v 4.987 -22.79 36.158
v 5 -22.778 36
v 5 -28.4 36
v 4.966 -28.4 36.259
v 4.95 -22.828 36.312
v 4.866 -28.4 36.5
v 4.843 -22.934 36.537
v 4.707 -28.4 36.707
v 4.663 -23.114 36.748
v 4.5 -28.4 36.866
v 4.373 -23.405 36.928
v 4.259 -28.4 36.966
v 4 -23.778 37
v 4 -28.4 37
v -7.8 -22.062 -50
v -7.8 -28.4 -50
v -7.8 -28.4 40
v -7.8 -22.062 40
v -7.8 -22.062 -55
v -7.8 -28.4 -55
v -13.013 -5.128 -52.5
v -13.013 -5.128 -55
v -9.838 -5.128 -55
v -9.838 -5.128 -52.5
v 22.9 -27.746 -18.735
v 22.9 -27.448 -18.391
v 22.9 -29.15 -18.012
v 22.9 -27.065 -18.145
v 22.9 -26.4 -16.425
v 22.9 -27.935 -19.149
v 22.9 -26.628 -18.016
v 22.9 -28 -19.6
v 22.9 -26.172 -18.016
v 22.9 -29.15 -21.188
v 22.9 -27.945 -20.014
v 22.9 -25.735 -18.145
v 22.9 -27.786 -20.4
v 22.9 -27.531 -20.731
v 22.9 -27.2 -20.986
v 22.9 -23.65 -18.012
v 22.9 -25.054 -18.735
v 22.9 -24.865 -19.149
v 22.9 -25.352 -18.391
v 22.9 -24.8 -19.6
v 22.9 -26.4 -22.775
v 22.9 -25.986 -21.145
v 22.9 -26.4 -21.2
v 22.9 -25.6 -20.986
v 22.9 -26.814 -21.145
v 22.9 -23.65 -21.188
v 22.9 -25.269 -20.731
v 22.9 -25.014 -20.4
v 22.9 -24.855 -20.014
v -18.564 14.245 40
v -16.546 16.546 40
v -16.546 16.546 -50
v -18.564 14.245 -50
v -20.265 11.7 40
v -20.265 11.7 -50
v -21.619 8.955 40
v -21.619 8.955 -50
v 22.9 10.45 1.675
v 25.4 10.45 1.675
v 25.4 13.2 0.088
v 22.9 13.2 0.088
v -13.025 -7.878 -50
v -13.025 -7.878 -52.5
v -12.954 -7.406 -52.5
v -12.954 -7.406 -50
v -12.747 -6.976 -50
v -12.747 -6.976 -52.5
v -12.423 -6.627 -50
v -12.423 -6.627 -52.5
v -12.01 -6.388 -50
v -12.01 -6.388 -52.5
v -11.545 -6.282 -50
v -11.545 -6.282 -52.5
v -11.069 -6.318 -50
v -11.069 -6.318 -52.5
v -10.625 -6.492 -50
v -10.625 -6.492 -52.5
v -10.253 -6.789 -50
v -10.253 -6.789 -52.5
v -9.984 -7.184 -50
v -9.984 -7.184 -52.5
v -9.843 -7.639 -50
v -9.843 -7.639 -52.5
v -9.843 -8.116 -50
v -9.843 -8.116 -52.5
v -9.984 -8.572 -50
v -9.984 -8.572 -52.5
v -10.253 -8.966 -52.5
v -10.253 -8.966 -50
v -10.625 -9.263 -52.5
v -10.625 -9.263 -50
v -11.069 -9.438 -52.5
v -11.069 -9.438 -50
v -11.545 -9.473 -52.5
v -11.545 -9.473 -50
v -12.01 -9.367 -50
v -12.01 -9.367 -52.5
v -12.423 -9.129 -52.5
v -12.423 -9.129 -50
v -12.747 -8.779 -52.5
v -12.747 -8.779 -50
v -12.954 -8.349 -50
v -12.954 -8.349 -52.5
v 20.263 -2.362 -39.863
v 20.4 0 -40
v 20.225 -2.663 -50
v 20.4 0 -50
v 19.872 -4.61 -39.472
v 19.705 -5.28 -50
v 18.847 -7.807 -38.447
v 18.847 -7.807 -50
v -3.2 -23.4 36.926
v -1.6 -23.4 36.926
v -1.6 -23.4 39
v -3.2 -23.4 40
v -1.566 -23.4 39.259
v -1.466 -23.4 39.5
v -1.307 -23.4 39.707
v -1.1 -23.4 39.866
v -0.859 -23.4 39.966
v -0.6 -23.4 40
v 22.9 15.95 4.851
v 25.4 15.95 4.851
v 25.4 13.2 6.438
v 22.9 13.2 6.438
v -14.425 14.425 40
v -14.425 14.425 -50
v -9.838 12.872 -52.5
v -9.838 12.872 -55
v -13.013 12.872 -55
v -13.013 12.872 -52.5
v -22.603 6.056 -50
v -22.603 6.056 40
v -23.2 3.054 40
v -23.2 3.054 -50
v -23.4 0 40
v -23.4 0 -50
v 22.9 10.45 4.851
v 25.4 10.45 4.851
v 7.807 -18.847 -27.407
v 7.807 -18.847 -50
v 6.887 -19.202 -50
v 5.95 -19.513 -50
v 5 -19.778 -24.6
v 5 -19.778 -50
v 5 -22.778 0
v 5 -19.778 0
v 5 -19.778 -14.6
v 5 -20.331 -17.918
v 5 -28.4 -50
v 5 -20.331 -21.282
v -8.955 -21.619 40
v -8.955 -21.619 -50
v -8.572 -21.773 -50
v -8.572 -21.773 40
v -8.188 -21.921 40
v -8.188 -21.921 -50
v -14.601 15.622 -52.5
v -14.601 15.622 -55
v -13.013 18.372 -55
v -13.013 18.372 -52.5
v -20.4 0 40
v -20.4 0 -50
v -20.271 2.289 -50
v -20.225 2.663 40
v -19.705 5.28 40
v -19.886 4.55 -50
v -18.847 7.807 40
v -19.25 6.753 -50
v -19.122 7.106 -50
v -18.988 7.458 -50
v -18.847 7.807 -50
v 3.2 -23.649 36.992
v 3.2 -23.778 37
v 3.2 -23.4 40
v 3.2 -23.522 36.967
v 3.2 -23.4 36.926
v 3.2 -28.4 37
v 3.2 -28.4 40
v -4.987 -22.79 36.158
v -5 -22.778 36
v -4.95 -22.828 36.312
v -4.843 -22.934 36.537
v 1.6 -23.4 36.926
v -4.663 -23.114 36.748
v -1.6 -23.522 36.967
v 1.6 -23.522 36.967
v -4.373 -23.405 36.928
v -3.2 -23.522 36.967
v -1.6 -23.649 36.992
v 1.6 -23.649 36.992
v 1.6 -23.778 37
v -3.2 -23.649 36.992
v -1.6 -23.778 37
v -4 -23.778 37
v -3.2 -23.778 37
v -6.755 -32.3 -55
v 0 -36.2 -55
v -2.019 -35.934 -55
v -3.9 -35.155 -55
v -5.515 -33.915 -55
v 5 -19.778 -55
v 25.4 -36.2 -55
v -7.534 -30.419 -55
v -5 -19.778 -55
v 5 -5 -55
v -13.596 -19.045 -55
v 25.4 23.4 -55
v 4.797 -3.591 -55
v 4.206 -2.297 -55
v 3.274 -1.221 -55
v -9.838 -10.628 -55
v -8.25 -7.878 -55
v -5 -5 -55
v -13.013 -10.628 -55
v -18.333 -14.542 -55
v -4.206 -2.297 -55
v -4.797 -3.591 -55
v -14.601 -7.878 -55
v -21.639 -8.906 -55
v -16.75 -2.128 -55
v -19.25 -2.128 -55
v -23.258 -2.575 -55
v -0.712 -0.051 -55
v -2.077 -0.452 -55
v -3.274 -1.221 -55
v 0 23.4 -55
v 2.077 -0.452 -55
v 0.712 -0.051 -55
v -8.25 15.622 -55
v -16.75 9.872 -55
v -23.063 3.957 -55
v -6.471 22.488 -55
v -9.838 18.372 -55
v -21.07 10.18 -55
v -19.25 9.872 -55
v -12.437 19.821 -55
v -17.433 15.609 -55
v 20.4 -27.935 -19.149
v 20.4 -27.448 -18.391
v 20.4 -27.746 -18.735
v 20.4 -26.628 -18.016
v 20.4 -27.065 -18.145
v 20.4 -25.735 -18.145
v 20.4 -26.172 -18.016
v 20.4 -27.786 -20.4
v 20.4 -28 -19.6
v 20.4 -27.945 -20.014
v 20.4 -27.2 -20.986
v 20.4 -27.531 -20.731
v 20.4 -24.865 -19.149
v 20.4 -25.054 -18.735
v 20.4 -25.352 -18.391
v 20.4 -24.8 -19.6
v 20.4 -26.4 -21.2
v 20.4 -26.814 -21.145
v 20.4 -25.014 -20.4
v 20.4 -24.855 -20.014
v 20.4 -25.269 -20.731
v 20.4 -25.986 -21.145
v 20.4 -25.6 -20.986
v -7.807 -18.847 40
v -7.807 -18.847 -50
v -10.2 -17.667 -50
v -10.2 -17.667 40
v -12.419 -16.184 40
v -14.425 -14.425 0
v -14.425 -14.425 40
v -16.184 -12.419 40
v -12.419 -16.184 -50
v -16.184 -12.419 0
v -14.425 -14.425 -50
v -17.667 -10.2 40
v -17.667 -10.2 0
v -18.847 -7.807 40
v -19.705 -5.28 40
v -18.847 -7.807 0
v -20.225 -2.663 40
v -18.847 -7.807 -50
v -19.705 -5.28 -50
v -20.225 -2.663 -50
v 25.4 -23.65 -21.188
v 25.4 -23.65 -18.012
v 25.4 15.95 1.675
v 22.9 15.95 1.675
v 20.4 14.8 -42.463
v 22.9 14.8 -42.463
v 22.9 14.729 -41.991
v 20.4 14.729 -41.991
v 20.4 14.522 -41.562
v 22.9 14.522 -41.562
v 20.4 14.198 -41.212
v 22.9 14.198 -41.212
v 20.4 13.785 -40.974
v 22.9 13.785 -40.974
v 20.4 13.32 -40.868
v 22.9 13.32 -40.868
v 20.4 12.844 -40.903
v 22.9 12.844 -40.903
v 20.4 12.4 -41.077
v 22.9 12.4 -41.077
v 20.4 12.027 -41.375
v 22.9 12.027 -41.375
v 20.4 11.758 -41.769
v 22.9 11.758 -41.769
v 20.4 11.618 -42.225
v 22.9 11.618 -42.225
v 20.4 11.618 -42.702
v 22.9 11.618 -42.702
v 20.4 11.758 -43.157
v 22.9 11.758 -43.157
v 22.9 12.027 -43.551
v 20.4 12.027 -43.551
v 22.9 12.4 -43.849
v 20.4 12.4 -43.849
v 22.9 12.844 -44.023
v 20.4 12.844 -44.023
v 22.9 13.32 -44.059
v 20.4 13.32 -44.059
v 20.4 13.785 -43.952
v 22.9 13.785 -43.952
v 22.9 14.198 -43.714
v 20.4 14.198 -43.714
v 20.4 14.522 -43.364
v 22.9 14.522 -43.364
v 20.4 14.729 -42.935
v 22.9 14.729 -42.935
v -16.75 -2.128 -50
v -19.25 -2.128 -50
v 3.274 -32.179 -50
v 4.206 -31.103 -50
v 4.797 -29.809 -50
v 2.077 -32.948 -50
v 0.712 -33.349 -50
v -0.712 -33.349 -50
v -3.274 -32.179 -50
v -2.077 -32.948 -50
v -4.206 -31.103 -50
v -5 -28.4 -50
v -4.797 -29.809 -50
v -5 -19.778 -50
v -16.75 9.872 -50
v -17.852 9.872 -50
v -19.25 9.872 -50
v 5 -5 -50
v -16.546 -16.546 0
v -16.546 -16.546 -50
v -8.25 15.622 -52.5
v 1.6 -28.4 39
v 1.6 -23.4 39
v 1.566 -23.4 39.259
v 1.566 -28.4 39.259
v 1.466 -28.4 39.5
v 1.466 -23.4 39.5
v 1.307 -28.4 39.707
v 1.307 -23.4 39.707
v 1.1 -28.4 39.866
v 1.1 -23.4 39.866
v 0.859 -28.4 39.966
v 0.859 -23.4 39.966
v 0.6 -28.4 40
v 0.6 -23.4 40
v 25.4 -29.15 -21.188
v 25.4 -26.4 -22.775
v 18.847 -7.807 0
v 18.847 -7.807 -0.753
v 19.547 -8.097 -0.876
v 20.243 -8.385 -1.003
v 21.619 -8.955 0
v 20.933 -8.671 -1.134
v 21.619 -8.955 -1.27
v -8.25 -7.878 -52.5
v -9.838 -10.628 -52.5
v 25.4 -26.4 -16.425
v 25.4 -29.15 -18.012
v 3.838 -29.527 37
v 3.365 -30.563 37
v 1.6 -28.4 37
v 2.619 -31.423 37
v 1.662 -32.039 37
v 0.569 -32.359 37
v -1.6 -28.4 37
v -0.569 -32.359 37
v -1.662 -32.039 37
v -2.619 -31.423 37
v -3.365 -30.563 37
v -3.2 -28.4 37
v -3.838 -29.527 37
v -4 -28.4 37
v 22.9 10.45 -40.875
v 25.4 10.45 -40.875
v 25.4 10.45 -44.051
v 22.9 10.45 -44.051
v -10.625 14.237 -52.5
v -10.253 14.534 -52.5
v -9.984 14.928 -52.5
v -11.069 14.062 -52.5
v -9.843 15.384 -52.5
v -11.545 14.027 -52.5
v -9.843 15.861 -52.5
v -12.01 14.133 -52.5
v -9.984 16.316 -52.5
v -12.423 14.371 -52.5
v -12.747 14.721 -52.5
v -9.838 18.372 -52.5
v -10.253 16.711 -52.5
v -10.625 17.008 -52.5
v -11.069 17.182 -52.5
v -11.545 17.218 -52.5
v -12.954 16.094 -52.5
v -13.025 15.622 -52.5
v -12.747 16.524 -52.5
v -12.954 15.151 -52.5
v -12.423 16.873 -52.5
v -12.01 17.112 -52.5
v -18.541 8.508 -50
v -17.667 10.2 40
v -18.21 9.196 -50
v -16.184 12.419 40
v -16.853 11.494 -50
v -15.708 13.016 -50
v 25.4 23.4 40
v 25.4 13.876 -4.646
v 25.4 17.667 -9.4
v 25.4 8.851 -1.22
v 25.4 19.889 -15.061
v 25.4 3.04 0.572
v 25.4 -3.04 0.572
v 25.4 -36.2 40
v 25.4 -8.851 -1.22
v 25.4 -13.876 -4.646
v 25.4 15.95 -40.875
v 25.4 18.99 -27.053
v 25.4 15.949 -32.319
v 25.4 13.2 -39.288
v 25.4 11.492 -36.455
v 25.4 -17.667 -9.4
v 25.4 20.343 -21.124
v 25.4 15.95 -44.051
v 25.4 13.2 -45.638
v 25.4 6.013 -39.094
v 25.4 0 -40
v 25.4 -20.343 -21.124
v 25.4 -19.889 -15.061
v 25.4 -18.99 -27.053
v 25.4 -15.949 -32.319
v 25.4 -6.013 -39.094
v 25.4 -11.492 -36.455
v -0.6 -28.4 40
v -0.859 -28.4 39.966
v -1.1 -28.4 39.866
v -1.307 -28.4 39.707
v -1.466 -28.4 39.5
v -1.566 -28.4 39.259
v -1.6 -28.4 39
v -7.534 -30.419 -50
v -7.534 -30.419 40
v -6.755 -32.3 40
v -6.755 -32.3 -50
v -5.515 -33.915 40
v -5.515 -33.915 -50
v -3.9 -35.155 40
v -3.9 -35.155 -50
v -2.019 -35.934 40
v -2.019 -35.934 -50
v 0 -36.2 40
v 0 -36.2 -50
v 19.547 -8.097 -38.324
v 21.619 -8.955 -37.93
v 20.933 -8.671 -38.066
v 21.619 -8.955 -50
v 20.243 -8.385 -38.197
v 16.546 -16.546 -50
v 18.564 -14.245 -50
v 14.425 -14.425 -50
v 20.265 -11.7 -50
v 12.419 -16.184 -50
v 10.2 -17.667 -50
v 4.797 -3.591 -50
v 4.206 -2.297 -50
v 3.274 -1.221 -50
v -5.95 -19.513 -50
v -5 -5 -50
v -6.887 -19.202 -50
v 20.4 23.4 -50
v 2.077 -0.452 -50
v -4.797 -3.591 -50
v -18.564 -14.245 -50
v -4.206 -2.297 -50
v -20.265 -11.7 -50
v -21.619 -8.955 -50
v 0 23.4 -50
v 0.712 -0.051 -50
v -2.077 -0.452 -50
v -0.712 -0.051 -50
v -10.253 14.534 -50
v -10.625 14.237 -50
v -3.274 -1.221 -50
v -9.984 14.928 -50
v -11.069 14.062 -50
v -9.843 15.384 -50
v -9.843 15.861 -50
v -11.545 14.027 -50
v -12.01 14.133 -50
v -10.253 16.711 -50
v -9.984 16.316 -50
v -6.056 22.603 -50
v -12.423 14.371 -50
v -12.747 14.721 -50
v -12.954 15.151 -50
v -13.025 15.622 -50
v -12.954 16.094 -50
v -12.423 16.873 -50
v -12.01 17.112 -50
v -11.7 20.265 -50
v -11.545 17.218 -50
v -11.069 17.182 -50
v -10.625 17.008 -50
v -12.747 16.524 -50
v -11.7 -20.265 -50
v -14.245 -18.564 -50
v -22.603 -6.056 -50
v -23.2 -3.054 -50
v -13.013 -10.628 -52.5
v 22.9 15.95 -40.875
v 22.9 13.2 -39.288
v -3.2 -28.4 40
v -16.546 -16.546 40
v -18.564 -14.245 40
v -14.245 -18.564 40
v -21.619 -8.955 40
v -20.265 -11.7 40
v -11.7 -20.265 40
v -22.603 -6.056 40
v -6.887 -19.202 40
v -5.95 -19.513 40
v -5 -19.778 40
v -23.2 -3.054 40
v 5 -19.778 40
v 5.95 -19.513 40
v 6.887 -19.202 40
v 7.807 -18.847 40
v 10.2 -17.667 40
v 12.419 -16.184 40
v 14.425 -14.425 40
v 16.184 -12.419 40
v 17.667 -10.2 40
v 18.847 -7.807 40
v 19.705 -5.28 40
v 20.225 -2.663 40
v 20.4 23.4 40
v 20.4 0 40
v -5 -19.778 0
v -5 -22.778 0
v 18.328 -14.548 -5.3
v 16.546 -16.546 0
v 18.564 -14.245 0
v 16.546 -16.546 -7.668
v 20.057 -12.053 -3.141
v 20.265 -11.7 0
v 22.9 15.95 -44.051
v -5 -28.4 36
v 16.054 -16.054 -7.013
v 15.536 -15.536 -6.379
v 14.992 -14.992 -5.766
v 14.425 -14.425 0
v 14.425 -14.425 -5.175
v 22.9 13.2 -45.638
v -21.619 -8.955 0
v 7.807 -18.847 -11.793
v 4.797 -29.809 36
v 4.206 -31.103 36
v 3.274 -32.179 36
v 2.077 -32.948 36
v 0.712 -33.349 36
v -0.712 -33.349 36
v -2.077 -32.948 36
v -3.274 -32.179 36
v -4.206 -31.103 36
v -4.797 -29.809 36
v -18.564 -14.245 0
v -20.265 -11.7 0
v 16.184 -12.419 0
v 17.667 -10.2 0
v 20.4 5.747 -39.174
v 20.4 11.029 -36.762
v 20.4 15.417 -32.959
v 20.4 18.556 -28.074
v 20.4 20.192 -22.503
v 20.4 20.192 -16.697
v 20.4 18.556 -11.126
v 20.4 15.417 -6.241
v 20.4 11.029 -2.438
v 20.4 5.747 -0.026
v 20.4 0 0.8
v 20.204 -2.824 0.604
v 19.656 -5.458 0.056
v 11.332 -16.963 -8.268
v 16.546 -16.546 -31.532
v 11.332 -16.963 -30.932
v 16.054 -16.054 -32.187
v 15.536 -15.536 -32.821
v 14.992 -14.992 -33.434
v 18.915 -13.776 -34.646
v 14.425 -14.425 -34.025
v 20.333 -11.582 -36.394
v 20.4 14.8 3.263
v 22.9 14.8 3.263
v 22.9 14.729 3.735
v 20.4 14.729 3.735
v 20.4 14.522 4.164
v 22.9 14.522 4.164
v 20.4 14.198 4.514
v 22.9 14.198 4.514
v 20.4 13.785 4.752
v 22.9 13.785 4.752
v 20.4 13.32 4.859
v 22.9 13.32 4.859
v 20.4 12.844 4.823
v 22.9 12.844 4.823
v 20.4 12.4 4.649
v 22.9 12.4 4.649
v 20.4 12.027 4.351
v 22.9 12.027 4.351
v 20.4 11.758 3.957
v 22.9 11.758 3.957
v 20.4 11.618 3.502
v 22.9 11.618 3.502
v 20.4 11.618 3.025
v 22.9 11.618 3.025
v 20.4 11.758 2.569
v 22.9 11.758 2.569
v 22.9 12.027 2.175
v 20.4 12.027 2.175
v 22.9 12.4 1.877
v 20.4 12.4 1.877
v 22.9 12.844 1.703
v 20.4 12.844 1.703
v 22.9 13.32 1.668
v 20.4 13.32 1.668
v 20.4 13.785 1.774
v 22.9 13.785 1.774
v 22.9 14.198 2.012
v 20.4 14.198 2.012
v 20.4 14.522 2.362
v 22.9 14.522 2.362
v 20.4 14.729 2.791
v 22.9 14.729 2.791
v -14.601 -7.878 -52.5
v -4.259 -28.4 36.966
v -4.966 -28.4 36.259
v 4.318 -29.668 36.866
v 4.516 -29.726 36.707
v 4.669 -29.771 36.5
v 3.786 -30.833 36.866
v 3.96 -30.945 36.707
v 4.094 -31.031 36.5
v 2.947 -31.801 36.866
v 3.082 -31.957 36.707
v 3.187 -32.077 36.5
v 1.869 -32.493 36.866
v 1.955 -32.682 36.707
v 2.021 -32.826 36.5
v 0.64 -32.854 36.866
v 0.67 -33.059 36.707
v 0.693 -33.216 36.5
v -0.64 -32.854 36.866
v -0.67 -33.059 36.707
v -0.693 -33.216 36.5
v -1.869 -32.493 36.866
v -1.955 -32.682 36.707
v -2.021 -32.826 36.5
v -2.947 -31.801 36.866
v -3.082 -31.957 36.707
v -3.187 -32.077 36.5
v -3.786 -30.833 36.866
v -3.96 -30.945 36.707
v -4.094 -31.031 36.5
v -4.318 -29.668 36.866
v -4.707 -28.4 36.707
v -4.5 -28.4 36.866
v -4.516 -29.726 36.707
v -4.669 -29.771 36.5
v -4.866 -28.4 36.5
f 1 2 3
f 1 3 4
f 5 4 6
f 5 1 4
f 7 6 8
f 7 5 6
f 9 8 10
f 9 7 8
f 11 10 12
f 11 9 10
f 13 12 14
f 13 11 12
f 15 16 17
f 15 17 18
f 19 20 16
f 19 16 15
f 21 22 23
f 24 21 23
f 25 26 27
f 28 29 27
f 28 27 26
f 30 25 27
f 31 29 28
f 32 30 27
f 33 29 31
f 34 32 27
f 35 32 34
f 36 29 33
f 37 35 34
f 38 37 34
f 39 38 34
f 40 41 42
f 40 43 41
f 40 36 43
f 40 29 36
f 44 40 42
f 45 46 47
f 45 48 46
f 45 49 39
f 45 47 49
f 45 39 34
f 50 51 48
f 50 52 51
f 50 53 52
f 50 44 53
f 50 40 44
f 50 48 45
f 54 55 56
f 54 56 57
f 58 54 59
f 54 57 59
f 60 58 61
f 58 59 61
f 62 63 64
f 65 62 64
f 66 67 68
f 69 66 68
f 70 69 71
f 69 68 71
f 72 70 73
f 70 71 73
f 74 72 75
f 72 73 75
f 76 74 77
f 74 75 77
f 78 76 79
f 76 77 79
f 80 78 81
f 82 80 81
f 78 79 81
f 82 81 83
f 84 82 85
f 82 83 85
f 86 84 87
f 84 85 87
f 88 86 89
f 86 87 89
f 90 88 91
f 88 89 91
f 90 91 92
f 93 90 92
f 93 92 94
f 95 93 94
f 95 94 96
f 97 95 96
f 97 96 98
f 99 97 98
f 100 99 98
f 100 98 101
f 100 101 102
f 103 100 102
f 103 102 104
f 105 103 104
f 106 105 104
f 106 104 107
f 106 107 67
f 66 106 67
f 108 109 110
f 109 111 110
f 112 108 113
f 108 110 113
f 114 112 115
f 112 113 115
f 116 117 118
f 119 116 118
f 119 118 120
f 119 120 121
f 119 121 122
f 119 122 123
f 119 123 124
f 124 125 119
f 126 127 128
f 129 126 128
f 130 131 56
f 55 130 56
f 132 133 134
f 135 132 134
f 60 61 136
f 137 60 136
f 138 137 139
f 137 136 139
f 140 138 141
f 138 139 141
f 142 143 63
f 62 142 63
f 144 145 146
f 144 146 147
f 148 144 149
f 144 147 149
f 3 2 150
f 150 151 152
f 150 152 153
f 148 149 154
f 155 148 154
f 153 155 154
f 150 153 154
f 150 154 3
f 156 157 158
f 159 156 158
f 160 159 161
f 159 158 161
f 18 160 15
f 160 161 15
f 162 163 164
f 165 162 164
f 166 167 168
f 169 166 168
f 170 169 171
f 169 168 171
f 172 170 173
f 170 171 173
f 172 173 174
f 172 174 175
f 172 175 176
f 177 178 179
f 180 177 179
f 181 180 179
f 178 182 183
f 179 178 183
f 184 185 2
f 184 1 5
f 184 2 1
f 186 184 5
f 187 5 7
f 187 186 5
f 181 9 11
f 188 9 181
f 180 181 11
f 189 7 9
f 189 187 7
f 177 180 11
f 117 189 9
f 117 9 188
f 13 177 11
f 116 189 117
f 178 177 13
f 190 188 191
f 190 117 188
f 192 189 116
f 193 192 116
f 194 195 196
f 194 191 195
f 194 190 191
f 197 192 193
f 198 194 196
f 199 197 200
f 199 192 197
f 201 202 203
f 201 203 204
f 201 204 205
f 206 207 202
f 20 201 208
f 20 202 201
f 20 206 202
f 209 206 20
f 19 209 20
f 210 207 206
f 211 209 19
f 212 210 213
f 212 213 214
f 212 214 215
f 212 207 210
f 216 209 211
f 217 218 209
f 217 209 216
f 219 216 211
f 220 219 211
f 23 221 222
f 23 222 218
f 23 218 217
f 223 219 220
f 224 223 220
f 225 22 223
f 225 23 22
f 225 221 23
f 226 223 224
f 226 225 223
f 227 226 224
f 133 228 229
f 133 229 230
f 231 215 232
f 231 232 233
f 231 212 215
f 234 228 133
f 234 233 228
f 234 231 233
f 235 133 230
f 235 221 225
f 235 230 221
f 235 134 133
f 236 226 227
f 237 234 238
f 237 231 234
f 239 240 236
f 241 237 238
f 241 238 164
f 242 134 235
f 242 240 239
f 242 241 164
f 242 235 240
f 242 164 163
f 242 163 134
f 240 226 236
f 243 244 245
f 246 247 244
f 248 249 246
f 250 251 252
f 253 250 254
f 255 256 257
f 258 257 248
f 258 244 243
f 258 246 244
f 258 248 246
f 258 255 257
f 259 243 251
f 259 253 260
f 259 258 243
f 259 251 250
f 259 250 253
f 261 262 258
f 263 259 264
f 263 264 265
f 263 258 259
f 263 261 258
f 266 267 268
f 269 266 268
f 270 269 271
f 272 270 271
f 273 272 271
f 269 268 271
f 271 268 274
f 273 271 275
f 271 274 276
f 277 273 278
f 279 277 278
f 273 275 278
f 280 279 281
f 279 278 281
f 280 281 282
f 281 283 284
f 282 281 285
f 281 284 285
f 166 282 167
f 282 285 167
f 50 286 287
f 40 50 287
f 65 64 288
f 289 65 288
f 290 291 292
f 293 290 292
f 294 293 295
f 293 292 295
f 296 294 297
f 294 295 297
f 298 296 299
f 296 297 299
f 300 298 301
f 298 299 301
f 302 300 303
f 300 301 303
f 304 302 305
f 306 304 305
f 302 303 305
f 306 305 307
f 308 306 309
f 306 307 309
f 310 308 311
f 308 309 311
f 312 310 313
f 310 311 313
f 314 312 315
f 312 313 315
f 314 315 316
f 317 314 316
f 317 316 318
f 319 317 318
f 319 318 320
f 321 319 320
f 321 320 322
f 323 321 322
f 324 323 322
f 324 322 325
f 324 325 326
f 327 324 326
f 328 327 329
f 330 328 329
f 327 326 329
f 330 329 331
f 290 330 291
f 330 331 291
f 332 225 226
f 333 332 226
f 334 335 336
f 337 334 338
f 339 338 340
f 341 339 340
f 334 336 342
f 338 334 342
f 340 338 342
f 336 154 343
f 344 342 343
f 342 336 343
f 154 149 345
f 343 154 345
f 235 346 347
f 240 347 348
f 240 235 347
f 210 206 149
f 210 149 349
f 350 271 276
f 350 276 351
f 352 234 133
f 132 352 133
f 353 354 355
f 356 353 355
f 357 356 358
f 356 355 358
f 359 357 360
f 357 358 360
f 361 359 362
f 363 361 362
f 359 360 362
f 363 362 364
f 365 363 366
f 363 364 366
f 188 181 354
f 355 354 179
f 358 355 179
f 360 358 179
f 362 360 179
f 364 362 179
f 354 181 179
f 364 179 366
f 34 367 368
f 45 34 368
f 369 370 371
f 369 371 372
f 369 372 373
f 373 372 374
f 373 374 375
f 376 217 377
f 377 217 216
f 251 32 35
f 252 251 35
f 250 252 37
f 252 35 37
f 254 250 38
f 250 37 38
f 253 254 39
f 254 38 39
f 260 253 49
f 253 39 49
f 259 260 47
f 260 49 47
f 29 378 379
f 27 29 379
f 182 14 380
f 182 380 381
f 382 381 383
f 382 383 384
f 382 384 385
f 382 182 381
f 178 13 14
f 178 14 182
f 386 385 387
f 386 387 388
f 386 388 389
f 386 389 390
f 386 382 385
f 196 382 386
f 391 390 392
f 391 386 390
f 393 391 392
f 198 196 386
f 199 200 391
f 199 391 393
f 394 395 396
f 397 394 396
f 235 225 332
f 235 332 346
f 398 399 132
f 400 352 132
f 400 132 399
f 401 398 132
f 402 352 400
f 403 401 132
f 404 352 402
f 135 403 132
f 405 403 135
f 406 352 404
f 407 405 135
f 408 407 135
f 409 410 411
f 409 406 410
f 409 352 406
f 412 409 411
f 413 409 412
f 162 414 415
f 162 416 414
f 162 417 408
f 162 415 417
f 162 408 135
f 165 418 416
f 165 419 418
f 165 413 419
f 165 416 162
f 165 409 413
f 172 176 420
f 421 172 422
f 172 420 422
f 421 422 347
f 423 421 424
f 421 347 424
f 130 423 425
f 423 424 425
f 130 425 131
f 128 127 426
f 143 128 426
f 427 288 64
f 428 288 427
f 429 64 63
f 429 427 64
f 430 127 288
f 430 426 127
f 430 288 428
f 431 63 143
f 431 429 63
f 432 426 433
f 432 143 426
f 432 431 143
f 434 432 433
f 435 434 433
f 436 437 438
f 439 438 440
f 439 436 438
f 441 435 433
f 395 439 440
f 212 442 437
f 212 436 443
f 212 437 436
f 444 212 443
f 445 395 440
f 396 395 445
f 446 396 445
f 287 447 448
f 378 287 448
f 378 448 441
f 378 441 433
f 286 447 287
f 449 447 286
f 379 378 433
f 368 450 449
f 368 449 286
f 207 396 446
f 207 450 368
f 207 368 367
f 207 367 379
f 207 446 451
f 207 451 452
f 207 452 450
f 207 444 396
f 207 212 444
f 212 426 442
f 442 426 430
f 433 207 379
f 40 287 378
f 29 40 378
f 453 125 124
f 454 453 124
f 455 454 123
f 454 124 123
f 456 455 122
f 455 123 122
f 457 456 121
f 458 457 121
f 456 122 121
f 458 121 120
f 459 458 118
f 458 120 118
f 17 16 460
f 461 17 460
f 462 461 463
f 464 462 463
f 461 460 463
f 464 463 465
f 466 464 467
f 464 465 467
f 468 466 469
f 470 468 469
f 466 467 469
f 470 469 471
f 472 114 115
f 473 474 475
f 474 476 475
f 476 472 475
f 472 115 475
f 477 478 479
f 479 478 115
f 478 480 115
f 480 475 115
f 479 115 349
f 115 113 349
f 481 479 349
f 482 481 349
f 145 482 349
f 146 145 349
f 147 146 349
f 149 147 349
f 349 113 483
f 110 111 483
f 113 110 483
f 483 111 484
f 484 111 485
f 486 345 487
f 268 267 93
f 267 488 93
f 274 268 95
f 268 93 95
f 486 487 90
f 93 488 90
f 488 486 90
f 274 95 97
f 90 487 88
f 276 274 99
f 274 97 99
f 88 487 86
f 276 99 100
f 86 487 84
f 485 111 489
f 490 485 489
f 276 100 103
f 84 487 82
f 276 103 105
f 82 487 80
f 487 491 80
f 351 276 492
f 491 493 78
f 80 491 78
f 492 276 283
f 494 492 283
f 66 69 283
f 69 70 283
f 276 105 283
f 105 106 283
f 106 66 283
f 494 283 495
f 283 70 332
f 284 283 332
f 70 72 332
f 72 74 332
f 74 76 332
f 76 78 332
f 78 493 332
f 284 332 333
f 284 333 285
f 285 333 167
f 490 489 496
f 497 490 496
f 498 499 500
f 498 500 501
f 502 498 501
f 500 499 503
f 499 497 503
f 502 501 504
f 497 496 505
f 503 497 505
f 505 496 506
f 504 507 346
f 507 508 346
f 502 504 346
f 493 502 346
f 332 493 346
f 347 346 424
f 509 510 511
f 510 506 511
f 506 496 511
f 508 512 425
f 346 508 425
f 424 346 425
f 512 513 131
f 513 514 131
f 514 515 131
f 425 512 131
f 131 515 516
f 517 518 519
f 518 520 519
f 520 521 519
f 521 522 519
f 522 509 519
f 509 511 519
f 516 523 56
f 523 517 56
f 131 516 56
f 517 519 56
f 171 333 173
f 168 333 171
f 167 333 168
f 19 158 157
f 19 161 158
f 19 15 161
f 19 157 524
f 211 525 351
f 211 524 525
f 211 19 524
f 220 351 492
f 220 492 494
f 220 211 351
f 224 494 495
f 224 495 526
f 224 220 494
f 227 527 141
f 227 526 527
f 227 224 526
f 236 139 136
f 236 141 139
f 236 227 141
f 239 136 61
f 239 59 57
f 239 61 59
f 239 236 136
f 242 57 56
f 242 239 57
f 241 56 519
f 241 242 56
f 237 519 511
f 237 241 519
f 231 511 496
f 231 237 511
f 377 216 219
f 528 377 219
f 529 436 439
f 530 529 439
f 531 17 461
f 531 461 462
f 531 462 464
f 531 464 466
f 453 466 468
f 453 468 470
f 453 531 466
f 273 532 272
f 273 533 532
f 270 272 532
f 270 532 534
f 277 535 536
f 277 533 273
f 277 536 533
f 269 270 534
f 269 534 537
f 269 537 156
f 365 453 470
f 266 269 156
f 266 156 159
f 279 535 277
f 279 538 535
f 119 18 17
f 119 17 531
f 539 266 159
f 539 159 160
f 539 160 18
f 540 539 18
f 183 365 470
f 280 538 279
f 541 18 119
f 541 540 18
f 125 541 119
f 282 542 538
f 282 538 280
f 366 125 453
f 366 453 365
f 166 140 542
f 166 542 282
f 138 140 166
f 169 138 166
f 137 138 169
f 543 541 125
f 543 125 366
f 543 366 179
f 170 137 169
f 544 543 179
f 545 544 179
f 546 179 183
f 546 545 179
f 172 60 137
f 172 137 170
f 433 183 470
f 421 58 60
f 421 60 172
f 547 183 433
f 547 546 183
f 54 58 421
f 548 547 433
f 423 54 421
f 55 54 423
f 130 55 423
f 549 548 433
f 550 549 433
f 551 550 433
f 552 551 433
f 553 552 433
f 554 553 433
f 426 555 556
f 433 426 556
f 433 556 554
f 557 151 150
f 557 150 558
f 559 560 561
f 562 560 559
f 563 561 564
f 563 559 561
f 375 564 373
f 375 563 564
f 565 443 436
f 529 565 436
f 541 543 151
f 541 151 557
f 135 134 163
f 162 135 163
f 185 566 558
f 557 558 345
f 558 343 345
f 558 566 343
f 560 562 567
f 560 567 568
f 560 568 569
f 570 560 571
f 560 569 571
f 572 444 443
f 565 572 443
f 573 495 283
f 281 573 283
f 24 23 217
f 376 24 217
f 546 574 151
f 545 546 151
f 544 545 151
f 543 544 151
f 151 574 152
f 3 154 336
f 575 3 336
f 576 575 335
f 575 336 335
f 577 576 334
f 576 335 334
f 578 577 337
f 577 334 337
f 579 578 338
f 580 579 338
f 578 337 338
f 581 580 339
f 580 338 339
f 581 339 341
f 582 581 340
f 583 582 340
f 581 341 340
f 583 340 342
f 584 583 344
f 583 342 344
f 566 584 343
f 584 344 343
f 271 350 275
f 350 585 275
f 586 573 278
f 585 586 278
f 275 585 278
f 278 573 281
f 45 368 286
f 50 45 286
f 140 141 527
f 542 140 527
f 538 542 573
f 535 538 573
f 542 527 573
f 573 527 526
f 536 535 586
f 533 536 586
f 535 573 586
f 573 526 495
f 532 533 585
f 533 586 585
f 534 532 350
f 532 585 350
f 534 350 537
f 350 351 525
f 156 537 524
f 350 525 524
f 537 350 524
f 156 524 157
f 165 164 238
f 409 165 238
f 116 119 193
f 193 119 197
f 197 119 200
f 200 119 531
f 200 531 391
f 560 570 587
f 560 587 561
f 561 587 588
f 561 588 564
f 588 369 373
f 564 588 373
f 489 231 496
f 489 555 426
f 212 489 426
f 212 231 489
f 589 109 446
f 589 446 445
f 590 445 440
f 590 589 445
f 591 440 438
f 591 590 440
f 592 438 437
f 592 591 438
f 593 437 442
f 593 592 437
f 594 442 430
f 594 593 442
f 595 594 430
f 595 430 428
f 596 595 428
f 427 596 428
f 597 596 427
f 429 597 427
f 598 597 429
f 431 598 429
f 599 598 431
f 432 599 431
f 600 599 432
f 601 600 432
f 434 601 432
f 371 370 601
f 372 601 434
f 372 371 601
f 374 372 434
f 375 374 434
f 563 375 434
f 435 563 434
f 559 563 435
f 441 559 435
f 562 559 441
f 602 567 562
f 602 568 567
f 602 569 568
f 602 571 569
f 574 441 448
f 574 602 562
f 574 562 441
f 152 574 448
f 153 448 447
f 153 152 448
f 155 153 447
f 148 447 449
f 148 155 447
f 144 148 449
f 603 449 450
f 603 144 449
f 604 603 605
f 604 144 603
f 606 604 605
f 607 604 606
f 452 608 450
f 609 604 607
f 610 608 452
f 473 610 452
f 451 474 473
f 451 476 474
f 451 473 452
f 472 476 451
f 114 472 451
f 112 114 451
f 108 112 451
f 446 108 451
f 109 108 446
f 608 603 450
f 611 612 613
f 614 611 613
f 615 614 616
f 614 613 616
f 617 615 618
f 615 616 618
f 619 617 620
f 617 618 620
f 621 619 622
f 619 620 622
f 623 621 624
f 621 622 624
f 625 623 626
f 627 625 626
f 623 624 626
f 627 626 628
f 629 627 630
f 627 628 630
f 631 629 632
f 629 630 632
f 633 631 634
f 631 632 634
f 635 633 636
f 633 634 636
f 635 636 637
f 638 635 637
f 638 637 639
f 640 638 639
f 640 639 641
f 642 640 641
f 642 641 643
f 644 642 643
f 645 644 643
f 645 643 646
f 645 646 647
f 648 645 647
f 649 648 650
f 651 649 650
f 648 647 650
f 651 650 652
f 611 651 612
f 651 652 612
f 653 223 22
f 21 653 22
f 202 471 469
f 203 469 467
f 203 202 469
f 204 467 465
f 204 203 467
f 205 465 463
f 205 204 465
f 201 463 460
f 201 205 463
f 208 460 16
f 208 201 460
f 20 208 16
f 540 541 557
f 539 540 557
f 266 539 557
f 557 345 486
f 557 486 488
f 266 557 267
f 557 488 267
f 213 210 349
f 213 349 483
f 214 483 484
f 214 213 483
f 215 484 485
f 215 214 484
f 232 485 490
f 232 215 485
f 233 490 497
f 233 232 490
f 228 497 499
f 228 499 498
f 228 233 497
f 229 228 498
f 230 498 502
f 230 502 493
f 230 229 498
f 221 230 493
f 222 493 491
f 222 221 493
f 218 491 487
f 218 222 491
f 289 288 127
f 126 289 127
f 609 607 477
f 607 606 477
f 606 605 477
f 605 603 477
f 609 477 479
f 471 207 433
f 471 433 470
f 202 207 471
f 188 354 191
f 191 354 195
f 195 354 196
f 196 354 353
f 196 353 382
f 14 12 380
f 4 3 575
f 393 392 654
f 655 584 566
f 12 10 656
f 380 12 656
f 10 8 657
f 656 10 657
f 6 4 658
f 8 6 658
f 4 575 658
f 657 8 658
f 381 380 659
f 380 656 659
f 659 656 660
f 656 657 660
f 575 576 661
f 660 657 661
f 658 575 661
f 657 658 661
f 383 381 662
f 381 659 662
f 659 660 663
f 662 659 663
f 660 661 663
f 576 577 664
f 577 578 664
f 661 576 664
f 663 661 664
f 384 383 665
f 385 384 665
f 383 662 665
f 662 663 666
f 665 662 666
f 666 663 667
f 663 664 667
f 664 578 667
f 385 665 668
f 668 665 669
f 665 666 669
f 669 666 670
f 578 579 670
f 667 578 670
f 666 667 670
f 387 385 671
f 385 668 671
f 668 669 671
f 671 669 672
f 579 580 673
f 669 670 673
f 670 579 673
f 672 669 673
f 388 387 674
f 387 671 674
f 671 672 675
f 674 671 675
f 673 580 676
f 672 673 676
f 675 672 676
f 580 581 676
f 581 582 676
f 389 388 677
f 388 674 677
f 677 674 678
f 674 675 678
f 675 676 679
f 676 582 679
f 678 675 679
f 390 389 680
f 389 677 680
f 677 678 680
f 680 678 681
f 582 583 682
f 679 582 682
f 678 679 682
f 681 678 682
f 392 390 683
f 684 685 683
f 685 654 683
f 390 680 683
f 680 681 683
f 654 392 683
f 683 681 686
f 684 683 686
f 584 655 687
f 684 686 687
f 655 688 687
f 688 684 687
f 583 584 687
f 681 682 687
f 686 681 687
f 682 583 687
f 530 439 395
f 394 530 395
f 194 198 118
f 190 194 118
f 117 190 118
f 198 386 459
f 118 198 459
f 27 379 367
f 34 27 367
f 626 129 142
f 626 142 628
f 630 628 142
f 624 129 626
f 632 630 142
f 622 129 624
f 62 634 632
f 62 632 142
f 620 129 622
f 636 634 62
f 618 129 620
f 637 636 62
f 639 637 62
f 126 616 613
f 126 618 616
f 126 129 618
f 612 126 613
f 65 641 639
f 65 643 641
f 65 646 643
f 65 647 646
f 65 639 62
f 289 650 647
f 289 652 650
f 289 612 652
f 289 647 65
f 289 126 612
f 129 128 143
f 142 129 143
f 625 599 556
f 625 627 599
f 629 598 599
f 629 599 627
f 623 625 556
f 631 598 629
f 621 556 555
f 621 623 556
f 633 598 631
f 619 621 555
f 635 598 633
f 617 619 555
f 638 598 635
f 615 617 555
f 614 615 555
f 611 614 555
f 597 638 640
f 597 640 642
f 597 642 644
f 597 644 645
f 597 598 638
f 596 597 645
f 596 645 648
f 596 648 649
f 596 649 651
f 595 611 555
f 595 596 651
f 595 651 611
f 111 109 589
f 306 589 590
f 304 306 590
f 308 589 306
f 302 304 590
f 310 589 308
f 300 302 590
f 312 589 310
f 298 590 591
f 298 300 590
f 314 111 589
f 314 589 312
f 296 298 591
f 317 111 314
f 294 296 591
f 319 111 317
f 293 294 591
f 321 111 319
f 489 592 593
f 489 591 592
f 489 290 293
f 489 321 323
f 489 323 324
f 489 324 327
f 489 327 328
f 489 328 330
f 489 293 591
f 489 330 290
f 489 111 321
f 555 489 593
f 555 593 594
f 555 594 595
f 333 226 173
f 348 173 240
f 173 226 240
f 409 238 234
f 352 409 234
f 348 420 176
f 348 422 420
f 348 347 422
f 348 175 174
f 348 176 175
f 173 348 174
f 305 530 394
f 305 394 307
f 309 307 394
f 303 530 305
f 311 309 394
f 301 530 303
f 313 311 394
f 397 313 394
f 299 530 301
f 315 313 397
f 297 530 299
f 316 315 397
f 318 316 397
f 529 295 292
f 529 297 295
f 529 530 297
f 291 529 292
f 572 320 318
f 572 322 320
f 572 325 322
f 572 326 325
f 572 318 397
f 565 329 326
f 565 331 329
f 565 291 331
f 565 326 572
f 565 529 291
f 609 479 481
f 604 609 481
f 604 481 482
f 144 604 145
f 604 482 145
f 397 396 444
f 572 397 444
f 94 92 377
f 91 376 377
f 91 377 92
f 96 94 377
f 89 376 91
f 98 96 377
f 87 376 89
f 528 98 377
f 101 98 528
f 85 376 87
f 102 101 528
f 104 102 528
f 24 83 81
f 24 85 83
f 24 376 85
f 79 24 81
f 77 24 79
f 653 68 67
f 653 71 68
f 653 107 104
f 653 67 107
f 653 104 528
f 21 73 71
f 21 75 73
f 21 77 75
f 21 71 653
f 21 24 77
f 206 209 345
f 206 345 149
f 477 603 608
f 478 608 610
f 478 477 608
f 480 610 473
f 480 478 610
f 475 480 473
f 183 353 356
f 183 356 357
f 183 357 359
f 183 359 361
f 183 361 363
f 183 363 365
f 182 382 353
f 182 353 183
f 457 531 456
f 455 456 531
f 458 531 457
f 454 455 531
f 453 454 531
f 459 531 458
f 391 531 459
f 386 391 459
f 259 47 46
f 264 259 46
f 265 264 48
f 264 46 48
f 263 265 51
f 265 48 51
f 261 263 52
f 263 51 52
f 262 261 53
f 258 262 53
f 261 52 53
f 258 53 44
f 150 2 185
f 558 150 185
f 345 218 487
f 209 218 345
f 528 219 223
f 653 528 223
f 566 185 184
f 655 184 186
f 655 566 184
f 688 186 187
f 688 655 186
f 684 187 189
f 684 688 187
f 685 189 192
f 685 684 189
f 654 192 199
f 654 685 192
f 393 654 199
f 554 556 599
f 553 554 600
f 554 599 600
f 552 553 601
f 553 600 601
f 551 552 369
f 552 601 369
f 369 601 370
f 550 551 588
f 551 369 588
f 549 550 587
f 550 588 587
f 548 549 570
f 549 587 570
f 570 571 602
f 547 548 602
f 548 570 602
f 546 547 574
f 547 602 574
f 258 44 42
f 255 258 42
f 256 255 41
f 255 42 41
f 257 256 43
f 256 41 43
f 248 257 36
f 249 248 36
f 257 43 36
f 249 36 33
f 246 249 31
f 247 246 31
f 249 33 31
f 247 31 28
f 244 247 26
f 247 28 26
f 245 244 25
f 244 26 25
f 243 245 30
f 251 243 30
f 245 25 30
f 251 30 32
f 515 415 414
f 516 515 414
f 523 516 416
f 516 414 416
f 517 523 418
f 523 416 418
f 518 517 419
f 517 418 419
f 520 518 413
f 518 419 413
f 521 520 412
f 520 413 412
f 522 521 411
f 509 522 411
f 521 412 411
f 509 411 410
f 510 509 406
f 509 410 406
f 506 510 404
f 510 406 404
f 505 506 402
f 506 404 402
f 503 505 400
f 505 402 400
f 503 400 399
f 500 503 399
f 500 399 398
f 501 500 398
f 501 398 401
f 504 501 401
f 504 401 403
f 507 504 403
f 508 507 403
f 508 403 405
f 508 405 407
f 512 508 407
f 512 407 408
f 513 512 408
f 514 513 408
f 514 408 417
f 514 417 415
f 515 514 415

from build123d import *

# Parameters (mm, degrees)
BOSS_EXTRUDE3_DEPTH  = 40
BOSS_EXTRUDE7_START  = -50
BOSS_EXTRUDE7_DEPTH  = 50
BOSS_EXTRUDE8_START  = -3
SKETCH3_W            = 1.6
SKETCH3_H            = 5
BOSS_EXTRUDE8_DEPTH  = 3
SKETCH5_W            = 10
SKETCH5_H            = 3
BOSS_EXTRUDE9_DEPTH  = 37
BOSS_EXTRUDE10_START = -90
BOSS_EXTRUDE10_DEPTH = 90
SKETCH8_R            = 20.4
CUT_EXTRUDE1_DEPTH   = 67.750280898
CUT_EXTRUDE2_DEPTH   = 2.5
SKETCH10_R           = 1.6
CUT_EXTRUDE3_DEPTH   = 2.5
FILLET1_R            = 1
BOSS_EXTRUDE12_START = -50
BOSS_EXTRUDE12_DEPTH = 90
BOSS_EXTRUDE13_START = 5
BOSS_EXTRUDE13_DEPTH = 5
SKETCH12_R           = 1.6
CUT_EXTRUDE4_DEPTH   = 2.5
SKETCH12_4_R         = 1.6
SKETCH12_4_W         = 2.5
SKETCH12_4_H         = 12
CUT_EXTRUDE5_DEPTH   = 5


with BuildPart() as part:
    # Sketch1 → Boss-Extrude3 (new body)
    with BuildSketch(Plane.XY):
        with BuildLine():
            Line((8.954792317, -21.618781061), (7.80674202, -18.847142463))
            ThreePointArc((7.80674202, -18.847142463), (6.420255058, -19.363375868), (5, -19.777765293))
            Line((5, -19.777765293), (5, -28.4))
            ThreePointArc((5, -28.4), (0, -33.4), (-5, -28.4))
            Line((-5, -28.4), (-5, -19.777765293))
            ThreePointArc((-5, -19.777765293), (-6.420255058, -19.363375868), (-7.80674202, -18.847142463))
            Line((-7.80674202, -18.847142463), (-8.954792317, -21.618781061))
            ThreePointArc((-8.954792317, -21.618781061), (-8.380323245, -21.847887365), (-7.8, -22.061731573))
            Line((-7.8, -22.061731573), (-7.8, -28.4))
            ThreePointArc((-7.8, -28.4), (0, -36.2), (7.8, -28.4))
            Line((7.8, -28.4), (7.8, -22.061731573))
            ThreePointArc((7.8, -22.061731573), (8.380323245, -21.847887365), (8.954792317, -21.618781061))
        make_face()
        with BuildLine():
            Line((16.54629868, -16.54629868), (14.424978336, -14.424978336))
            ThreePointArc((14.424978336, -14.424978336), (11.333632754, -16.961980091), (7.80674202, -18.847142463))
            Line((7.80674202, -18.847142463), (8.954792317, -21.618781061))
            ThreePointArc((8.954792317, -21.618781061), (13.000343453, -19.456388928), (16.54629868, -16.54629868))
        make_face()
        with BuildLine():
            ThreePointArc((-7.80674202, -18.847142463), (-11.333632754, -16.961980091), (-14.424978336, -14.424978336))
            Line((-14.424978336, -14.424978336), (-16.54629868, -16.54629868))
            ThreePointArc((-16.54629868, -16.54629868), (-13.000343453, -19.456388928), (-8.954792317, -21.618781061))
            Line((-8.954792317, -21.618781061), (-7.80674202, -18.847142463))
        make_face()
        with BuildLine():
            ThreePointArc((-18.847142463, -7.80674202), (-20.00801972, -3.979842569), (-20.4, 0))
            Line((-20.4, 0), (-23.4, 0))
            ThreePointArc((-23.4, 0), (-22.950375561, -4.565113535), (-21.618781061, -8.954792317))
            Line((-21.618781061, -8.954792317), (-18.847142463, -7.80674202))
        make_face()
        with BuildLine():
            Line((21.618781061, -8.954792317), (18.847142463, -7.80674202))
            ThreePointArc((18.847142463, -7.80674202), (16.961980091, -11.333632754), (14.424978336, -14.424978336))
            Line((14.424978336, -14.424978336), (16.54629868, -16.54629868))
            ThreePointArc((16.54629868, -16.54629868), (19.456388928, -13.000343453), (21.618781061, -8.954792317))
        make_face()
        with BuildLine():
            Line((23.4, 0), (20.4, 0))
            ThreePointArc((20.4, 0), (20.00801972, -3.979842569), (18.847142463, -7.80674202))
            Line((18.847142463, -7.80674202), (21.618781061, -8.954792317))
            ThreePointArc((21.618781061, -8.954792317), (22.950375561, -4.565113535), (23.4, 0))
        make_face()
        with BuildLine():
            ThreePointArc((-14.424978336, -14.424978336), (-16.961980091, -11.333632754), (-18.847142463, -7.80674202))
            Line((-18.847142463, -7.80674202), (-21.618781061, -8.954792317))
            ThreePointArc((-21.618781061, -8.954792317), (-19.456388928, -13.000343453), (-16.54629868, -16.54629868))
            Line((-16.54629868, -16.54629868), (-14.424978336, -14.424978336))
        make_face()
    extrude(amount=BOSS_EXTRUDE3_DEPTH)

    # Sketch1<12> → Boss-Extrude7 (add)
    with BuildSketch(Plane.XY.offset(BOSS_EXTRUDE7_START)):
        with BuildLine():
            Line((16.54629868, -16.54629868), (14.424978336, -14.424978336))
            ThreePointArc((14.424978336, -14.424978336), (11.333632754, -16.961980091), (7.80674202, -18.847142463))
            Line((7.80674202, -18.847142463), (8.954792317, -21.618781061))
            ThreePointArc((8.954792317, -21.618781061), (13.000343453, -19.456388928), (16.54629868, -16.54629868))
        make_face()
        with BuildLine():
            Line((8.954792317, -21.618781061), (7.80674202, -18.847142463))
            ThreePointArc((7.80674202, -18.847142463), (6.420255058, -19.363375868), (5, -19.777765293))
            Line((5, -19.777765293), (5, -28.4))
            ThreePointArc((5, -28.4), (0, -33.4), (-5, -28.4))
            Line((-5, -28.4), (-5, -19.777765293))
            ThreePointArc((-5, -19.777765293), (-6.420255058, -19.363375868), (-7.80674202, -18.847142463))
            Line((-7.80674202, -18.847142463), (-8.954792317, -21.618781061))
            ThreePointArc((-8.954792317, -21.618781061), (-8.380323245, -21.847887365), (-7.8, -22.061731573))
            Line((-7.8, -22.061731573), (-7.8, -28.4))
            ThreePointArc((-7.8, -28.4), (0, -36.2), (7.8, -28.4))
            Line((7.8, -28.4), (7.8, -22.061731573))
            ThreePointArc((7.8, -22.061731573), (8.380323245, -21.847887365), (8.954792317, -21.618781061))
        make_face()
        with BuildLine():
            ThreePointArc((-18.847142463, -7.80674202), (-20.00801972, -3.979842569), (-20.4, 0))
            Line((-20.4, 0), (-23.4, 0))
            ThreePointArc((-23.4, 0), (-22.950375561, -4.565113535), (-21.618781061, -8.954792317))
            Line((-21.618781061, -8.954792317), (-18.847142463, -7.80674202))
        make_face()
        with BuildLine():
            Line((23.4, 0), (20.4, 0))
            ThreePointArc((20.4, 0), (20.00801972, -3.979842569), (18.847142463, -7.80674202))
            Line((18.847142463, -7.80674202), (21.618781061, -8.954792317))
            ThreePointArc((21.618781061, -8.954792317), (22.950375561, -4.565113535), (23.4, 0))
        make_face()
        with BuildLine():
            ThreePointArc((-7.80674202, -18.847142463), (-11.333632754, -16.961980091), (-14.424978336, -14.424978336))
            Line((-14.424978336, -14.424978336), (-16.54629868, -16.54629868))
            ThreePointArc((-16.54629868, -16.54629868), (-13.000343453, -19.456388928), (-8.954792317, -21.618781061))
            Line((-8.954792317, -21.618781061), (-7.80674202, -18.847142463))
        make_face()
    extrude(amount=BOSS_EXTRUDE7_DEPTH)

    # Sketch3 → Boss-Extrude8 (add)
    with BuildSketch(Plane.XY.offset(40).offset(BOSS_EXTRUDE8_START)):
        with BuildLine():
            Line((-5, -19.777765293), (5, -19.777765293))
            Line((5, -19.777765293), (5, -28.4))
            ThreePointArc((5, -28.4), (0, -33.4), (-5, -28.4))
            Line((-5, -28.4), (-5, -19.777765293))
        make_face()
        with Locations((2.4, -25.9)):
            Rectangle(SKETCH3_W, SKETCH3_H, mode=Mode.SUBTRACT)
        with Locations((-2.4, -25.9)):
            Rectangle(SKETCH3_W, SKETCH3_H, mode=Mode.SUBTRACT)
    extrude(amount=BOSS_EXTRUDE8_DEPTH)

    # Sketch5 → Boss-Extrude9 (add)
    with BuildSketch(Plane(origin=(0, 0, 37), x_dir=(-1, 0, 0), z_dir=(0, 0, -1))):
        with Locations((0, -21.277765293)):
            Rectangle(SKETCH5_W, SKETCH5_H)
    extrude(amount=BOSS_EXTRUDE9_DEPTH)

    # Sketch6 → Boss-Extrude10 (add)
    with BuildSketch(Plane.XY.offset(40).offset(BOSS_EXTRUDE10_START)):
        with BuildLine():
            Line((20.4, 0), (20.4, 23.4))
            Line((20.4, 23.4), (25.4, 23.4))
            Line((25.4, 23.4), (25.4, -36.2))
            Line((25.4, -36.2), (0, -36.2))
            ThreePointArc((0, -36.2), (5.515432893, -33.915432893), (7.8, -28.4))
            Line((7.8, -28.4), (7.8, -22.061731573))
            ThreePointArc((7.8, -22.061731573), (19.106019994, -13.509996299), (23.4, 0))
            Line((23.4, 0), (20.4, 0))
        make_face()
    extrude(amount=BOSS_EXTRUDE10_DEPTH)

    # Sketch8 → Cut-Extrude1 (cut, through all)
    with BuildSketch(Plane(origin=(0, 0, 0), x_dir=(0, 0, -1), z_dir=(1, 0, 0))):
        with Locations((19.6, 0)):
            Circle(SKETCH8_R)
    extrude(amount=CUT_EXTRUDE1_DEPTH, mode=Mode.SUBTRACT)

    # Sketch9 → Cut-Extrude2 (cut)
    with BuildSketch(Plane(origin=(25.4, 0, 0), x_dir=(0, 0, -1), z_dir=(1, 0, 0))):
        Polygon((18.01228676, -29.15), (21.18771324, -29.15), (22.775426481, -26.4), (21.18771324, -23.65), (18.01228676, -23.65), (16.424573519, -26.4), align=None)
        Polygon((-4.8507839, 10.45), (-1.67535742, 10.45), (-0.087644179, 13.2), (-1.67535742, 15.95), (-4.8507839, 15.95), (-6.43849714, 13.2), align=None)
        Polygon((40.87535742, 15.95), (39.287644179, 13.2), (40.87535742, 10.45), (44.0507839, 10.45), (45.63849714, 13.2), (44.0507839, 15.95), align=None)
    extrude(amount=-CUT_EXTRUDE2_DEPTH, mode=Mode.SUBTRACT)

    # Sketch10 → Cut-Extrude3 (cut)
    with BuildSketch(Plane(origin=(22.9, 0, 0), x_dir=(0, 0, -1), z_dir=(1, 0, 0))):
        with BuildLine():
            ThreePointArc((21.2, -26.4), (20.73137085, -25.26862915), (19.6, -24.8))
            Line((19.6, -24.8), (19.6, -28))
            ThreePointArc((19.6, -28), (20.73137085, -27.53137085), (21.2, -26.4))
        make_face()
        with BuildLine():
            Line((19.6, -28), (19.6, -24.8))
            ThreePointArc((19.6, -24.8), (18, -26.4), (19.6, -28))
        make_face()
        with Locations(Location((-3.26307066, 13.2, 0), (0, 0, 90))):
            Circle(SKETCH10_R)
        with Locations(Location((42.46307066, 13.2, 0), (0, 0, 90))):
            Circle(SKETCH10_R)
    extrude(amount=-CUT_EXTRUDE3_DEPTH, mode=Mode.SUBTRACT)

    # Fillet1
    # the kernel refuses this fillet: 1 mm, written as the material it adds along each edge
    with BuildSketch(Plane(origin=(-7.5, -22.777765293, 37), x_dir=(0, 0, -1), z_dir=(1, 0, 0))) as fillet1_piece_1_section:
        with BuildLine():
            CenterArc((FILLET1_R, -FILLET1_R), FILLET1_R, 90, 90)
            Line((0, -FILLET1_R), (0, 0))
            Line((0, 0), (FILLET1_R, 0))
        make_face()
    fillet1_piece_1 = extrude(amount=15, mode=Mode.PRIVATE)
    fillet1_piece_1 = split(fillet1_piece_1, bisect_by=Plane(origin=(-4.1, -23.4, 36.767628844), z_dir=(0, 1, 0)), keep=Keep.TOP, mode=Mode.PRIVATE)
    add(fillet1_piece_1)
    with BuildSketch(Plane(origin=(-7.5, -22.777765293, 37), x_dir=(0, 0, -1), z_dir=(1, 0, 0))) as fillet1_piece_2_section:
        with BuildLine():
            CenterArc((FILLET1_R, -FILLET1_R), FILLET1_R, 90, 90)
            Line((0, -FILLET1_R), (0, 0))
            Line((0, 0), (FILLET1_R, 0))
        make_face()
    fillet1_piece_2 = extrude(amount=15, mode=Mode.PRIVATE)
    fillet1_piece_2 = split(fillet1_piece_2, bisect_by=Plane(origin=(-3.2, -23.493727337, 36.977919101), z_dir=(-1, 0, 0)), keep=Keep.TOP, mode=Mode.PRIVATE)
    add(fillet1_piece_2)
    with BuildSketch(Plane(origin=(-7.5, -22.777765293, 37), x_dir=(0, 0, -1), z_dir=(1, 0, 0))) as fillet1_piece_3_section:
        with BuildLine():
            CenterArc((FILLET1_R, -FILLET1_R), FILLET1_R, 90, 90)
            Line((0, -FILLET1_R), (0, 0))
            Line((0, 0), (FILLET1_R, 0))
        make_face()
    fillet1_piece_3 = extrude(amount=15, mode=Mode.PRIVATE)
    fillet1_piece_3 = split(fillet1_piece_3, bisect_by=Plane(origin=(-1.6, -23.493727337, 36.977919101), z_dir=(1, 0, 0)), keep=Keep.TOP, mode=Mode.PRIVATE)
    fillet1_piece_3 = split(fillet1_piece_3, bisect_by=Plane(origin=(1.6, -23.493727337, 36.977919101), z_dir=(-1, 0, 0)), keep=Keep.TOP, mode=Mode.PRIVATE)
    add(fillet1_piece_3)
    with BuildSketch(Plane(origin=(-7.5, -22.777765293, 37), x_dir=(0, 0, -1), z_dir=(1, 0, 0))) as fillet1_piece_4_section:
        with BuildLine():
            CenterArc((FILLET1_R, -FILLET1_R), FILLET1_R, 90, 90)
            Line((0, -FILLET1_R), (0, 0))
            Line((0, 0), (FILLET1_R, 0))
        make_face()
    fillet1_piece_4 = extrude(amount=15, mode=Mode.PRIVATE)
    fillet1_piece_4 = split(fillet1_piece_4, bisect_by=Plane(origin=(3.2, -23.493727337, 36.977919101), z_dir=(1, 0, 0)), keep=Keep.TOP, mode=Mode.PRIVATE)
    add(fillet1_piece_4)
    with BuildSketch(Plane(origin=(-5, -28.4, 37), x_dir=(0, 0, -1), z_dir=(0, 1, 0)), Plane(origin=(5, -20.277765293, 37), x_dir=(0, 0, -1), z_dir=(0, -1, 0))) as fillet1_piece_5:
        with BuildLine():
            CenterArc((FILLET1_R, -FILLET1_R), FILLET1_R, 90, 90)
            Line((0, -FILLET1_R), (0, 0))
            Line((0, 0), (FILLET1_R, 0))
        make_face()
    extrude(amount=8.122234707)
    with BuildSketch(Plane(origin=(0, -28.4, 37), x_dir=(1, 0, 0), z_dir=(0, 1, 0))) as fillet1_piece_6:
        with BuildLine():
            CenterArc((5 - FILLET1_R, FILLET1_R), FILLET1_R, 270, 90)
            Line((5 - FILLET1_R, 0), (5, 0))
            Line((5, 0), (5, FILLET1_R))
        make_face()
    revolve(axis=Axis((0, -28.4, 37), (0, 0, -1)), revolution_arc=180)
    # the kernel refuses this fillet: 1 mm, written as the material it takes off along each edge
    with BuildSketch(Plane(origin=(1.6, -23.4, 40), x_dir=(-1, 0, 0), z_dir=(0, -1, 0))) as fillet1_2_piece_1:
        with BuildLine():
            CenterArc((FILLET1_R, FILLET1_R), FILLET1_R, 180, 90)
            Line((0, FILLET1_R), (0, 0))
            Line((0, 0), (FILLET1_R, 0))
        make_face()
    extrude(amount=5, mode=Mode.SUBTRACT)
    with BuildSketch(Plane(origin=(-1.6, -23.4, 40), x_dir=(1, 0, 0), z_dir=(0, -1, 0))) as fillet1_2_piece_2:
        with BuildLine():
            CenterArc((FILLET1_R, -FILLET1_R), FILLET1_R, 90, 90)
            Line((0, -FILLET1_R), (0, 0))
            Line((0, 0), (FILLET1_R, 0))
        make_face()
    extrude(amount=5, mode=Mode.SUBTRACT)

    # Sketch1<13> → Boss-Extrude12 (add)
    with BuildSketch(Plane.XY.offset(BOSS_EXTRUDE12_START)):
        with BuildLine():
            ThreePointArc((-20.4, 0), (-20.00801972, 3.979842569), (-18.847142463, 7.80674202))
            Line((-18.847142463, 7.80674202), (-21.618781061, 8.954792317))
            ThreePointArc((-21.618781061, 8.954792317), (-22.950375561, 4.565113535), (-23.4, 0))
            Line((-23.4, 0), (-20.4, 0))
        make_face()
        with BuildLine():
            ThreePointArc((-18.847142463, 7.80674202), (-16.961980091, 11.333632754), (-14.424978336, 14.424978336))
            Line((-14.424978336, 14.424978336), (-16.54629868, 16.54629868))
            ThreePointArc((-16.54629868, 16.54629868), (-19.456388928, 13.000343453), (-21.618781061, 8.954792317))
            Line((-21.618781061, 8.954792317), (-18.847142463, 7.80674202))
        make_face()
    extrude(amount=BOSS_EXTRUDE12_DEPTH)

    # Sketch11 → Boss-Extrude13 (add)
    with BuildSketch(Plane(origin=(0, 0, -50), x_dir=(-1, 0, 0), z_dir=(0, 0, -1)).offset(BOSS_EXTRUDE13_START)):
        with BuildLine():
            ThreePointArc((7.8, -22.061731573), (23.063006296, 3.956986302), (0, 23.4))
            Line((0, 23.4), (-25.4, 23.4))
            Line((-25.4, 23.4), (-25.4, -36.2))
            Line((-25.4, -36.2), (0, -36.2))
            ThreePointArc((0, -36.2), (5.515432893, -33.915432893), (7.8, -28.4))
            Line((7.8, -28.4), (7.8, -22.061731573))
        make_face()
        with BuildLine():
            ThreePointArc((-5, -5), (0, 0), (5, -5))
            Line((5, -5), (5, -19.777765293))
            Line((5, -19.777765293), (-5, -19.777765293))
            Line((-5, -19.777765293), (-5, -5))
        make_face(mode=Mode.SUBTRACT)
    extrude(amount=-BOSS_EXTRUDE13_DEPTH)

    # Sketch12 → Cut-Extrude4 (cut)
    # profile 1 of 4: a face of its own
    with BuildSketch(Plane(origin=(0, 0, -55), x_dir=(-1, 0, 0), z_dir=(0, 0, -1))):
        Polygon((8.25, 15.622234707), (9.83771324, 12.872234707), (13.013139721, 12.872234707), (14.600852961, 15.622234707), (13.013139721, 18.372234707), (9.83771324, 18.372234707), align=None)
        with Locations((11.425426481, 15.622234707)):
            Circle(SKETCH12_R, mode=Mode.SUBTRACT)
    # profile 2 of 4: a face of its own
    with BuildSketch(Plane(origin=(0, 0, -55), x_dir=(-1, 0, 0), z_dir=(0, 0, -1))):
        with Locations((11.425426481, 15.622234707)):
            Circle(SKETCH12_R)
    # profile 3 of 4: a face of its own
    with BuildSketch(Plane(origin=(0, 0, -55), x_dir=(-1, 0, 0), z_dir=(0, 0, -1))):
        Polygon((14.600852961, -7.877765293), (13.013139721, -5.127765293), (9.83771324, -5.127765293), (8.25, -7.877765293), (9.83771324, -10.627765293), (13.013139721, -10.627765293), align=None)
        with Locations((11.425426481, -7.877765293)):
            Circle(SKETCH12_R, mode=Mode.SUBTRACT)
    # profile 4 of 4: a face of its own
    with BuildSketch(Plane(origin=(0, 0, -55), x_dir=(-1, 0, 0), z_dir=(0, 0, -1))):
        with Locations((11.425426481, -7.877765293)):
            Circle(SKETCH12_R)
    extrude(amount=-CUT_EXTRUDE4_DEPTH, mode=Mode.SUBTRACT)

    # Sketch12<4> → Cut-Extrude5 (cut)
    with BuildSketch(Plane(origin=(0, 0, -55), x_dir=(-1, 0, 0), z_dir=(0, 0, -1))):
        with Locations((11.425426481, 15.622234707)):
            Circle(SKETCH12_4_R)
        with Locations((11.425426481, -7.877765293)):
            Circle(SKETCH12_4_R)
        with Locations((18, 3.872234707)):
            Rectangle(SKETCH12_4_W, SKETCH12_4_H)
    extrude(amount=-CUT_EXTRUDE5_DEPTH, mode=Mode.SUBTRACT)


solid = part.part
